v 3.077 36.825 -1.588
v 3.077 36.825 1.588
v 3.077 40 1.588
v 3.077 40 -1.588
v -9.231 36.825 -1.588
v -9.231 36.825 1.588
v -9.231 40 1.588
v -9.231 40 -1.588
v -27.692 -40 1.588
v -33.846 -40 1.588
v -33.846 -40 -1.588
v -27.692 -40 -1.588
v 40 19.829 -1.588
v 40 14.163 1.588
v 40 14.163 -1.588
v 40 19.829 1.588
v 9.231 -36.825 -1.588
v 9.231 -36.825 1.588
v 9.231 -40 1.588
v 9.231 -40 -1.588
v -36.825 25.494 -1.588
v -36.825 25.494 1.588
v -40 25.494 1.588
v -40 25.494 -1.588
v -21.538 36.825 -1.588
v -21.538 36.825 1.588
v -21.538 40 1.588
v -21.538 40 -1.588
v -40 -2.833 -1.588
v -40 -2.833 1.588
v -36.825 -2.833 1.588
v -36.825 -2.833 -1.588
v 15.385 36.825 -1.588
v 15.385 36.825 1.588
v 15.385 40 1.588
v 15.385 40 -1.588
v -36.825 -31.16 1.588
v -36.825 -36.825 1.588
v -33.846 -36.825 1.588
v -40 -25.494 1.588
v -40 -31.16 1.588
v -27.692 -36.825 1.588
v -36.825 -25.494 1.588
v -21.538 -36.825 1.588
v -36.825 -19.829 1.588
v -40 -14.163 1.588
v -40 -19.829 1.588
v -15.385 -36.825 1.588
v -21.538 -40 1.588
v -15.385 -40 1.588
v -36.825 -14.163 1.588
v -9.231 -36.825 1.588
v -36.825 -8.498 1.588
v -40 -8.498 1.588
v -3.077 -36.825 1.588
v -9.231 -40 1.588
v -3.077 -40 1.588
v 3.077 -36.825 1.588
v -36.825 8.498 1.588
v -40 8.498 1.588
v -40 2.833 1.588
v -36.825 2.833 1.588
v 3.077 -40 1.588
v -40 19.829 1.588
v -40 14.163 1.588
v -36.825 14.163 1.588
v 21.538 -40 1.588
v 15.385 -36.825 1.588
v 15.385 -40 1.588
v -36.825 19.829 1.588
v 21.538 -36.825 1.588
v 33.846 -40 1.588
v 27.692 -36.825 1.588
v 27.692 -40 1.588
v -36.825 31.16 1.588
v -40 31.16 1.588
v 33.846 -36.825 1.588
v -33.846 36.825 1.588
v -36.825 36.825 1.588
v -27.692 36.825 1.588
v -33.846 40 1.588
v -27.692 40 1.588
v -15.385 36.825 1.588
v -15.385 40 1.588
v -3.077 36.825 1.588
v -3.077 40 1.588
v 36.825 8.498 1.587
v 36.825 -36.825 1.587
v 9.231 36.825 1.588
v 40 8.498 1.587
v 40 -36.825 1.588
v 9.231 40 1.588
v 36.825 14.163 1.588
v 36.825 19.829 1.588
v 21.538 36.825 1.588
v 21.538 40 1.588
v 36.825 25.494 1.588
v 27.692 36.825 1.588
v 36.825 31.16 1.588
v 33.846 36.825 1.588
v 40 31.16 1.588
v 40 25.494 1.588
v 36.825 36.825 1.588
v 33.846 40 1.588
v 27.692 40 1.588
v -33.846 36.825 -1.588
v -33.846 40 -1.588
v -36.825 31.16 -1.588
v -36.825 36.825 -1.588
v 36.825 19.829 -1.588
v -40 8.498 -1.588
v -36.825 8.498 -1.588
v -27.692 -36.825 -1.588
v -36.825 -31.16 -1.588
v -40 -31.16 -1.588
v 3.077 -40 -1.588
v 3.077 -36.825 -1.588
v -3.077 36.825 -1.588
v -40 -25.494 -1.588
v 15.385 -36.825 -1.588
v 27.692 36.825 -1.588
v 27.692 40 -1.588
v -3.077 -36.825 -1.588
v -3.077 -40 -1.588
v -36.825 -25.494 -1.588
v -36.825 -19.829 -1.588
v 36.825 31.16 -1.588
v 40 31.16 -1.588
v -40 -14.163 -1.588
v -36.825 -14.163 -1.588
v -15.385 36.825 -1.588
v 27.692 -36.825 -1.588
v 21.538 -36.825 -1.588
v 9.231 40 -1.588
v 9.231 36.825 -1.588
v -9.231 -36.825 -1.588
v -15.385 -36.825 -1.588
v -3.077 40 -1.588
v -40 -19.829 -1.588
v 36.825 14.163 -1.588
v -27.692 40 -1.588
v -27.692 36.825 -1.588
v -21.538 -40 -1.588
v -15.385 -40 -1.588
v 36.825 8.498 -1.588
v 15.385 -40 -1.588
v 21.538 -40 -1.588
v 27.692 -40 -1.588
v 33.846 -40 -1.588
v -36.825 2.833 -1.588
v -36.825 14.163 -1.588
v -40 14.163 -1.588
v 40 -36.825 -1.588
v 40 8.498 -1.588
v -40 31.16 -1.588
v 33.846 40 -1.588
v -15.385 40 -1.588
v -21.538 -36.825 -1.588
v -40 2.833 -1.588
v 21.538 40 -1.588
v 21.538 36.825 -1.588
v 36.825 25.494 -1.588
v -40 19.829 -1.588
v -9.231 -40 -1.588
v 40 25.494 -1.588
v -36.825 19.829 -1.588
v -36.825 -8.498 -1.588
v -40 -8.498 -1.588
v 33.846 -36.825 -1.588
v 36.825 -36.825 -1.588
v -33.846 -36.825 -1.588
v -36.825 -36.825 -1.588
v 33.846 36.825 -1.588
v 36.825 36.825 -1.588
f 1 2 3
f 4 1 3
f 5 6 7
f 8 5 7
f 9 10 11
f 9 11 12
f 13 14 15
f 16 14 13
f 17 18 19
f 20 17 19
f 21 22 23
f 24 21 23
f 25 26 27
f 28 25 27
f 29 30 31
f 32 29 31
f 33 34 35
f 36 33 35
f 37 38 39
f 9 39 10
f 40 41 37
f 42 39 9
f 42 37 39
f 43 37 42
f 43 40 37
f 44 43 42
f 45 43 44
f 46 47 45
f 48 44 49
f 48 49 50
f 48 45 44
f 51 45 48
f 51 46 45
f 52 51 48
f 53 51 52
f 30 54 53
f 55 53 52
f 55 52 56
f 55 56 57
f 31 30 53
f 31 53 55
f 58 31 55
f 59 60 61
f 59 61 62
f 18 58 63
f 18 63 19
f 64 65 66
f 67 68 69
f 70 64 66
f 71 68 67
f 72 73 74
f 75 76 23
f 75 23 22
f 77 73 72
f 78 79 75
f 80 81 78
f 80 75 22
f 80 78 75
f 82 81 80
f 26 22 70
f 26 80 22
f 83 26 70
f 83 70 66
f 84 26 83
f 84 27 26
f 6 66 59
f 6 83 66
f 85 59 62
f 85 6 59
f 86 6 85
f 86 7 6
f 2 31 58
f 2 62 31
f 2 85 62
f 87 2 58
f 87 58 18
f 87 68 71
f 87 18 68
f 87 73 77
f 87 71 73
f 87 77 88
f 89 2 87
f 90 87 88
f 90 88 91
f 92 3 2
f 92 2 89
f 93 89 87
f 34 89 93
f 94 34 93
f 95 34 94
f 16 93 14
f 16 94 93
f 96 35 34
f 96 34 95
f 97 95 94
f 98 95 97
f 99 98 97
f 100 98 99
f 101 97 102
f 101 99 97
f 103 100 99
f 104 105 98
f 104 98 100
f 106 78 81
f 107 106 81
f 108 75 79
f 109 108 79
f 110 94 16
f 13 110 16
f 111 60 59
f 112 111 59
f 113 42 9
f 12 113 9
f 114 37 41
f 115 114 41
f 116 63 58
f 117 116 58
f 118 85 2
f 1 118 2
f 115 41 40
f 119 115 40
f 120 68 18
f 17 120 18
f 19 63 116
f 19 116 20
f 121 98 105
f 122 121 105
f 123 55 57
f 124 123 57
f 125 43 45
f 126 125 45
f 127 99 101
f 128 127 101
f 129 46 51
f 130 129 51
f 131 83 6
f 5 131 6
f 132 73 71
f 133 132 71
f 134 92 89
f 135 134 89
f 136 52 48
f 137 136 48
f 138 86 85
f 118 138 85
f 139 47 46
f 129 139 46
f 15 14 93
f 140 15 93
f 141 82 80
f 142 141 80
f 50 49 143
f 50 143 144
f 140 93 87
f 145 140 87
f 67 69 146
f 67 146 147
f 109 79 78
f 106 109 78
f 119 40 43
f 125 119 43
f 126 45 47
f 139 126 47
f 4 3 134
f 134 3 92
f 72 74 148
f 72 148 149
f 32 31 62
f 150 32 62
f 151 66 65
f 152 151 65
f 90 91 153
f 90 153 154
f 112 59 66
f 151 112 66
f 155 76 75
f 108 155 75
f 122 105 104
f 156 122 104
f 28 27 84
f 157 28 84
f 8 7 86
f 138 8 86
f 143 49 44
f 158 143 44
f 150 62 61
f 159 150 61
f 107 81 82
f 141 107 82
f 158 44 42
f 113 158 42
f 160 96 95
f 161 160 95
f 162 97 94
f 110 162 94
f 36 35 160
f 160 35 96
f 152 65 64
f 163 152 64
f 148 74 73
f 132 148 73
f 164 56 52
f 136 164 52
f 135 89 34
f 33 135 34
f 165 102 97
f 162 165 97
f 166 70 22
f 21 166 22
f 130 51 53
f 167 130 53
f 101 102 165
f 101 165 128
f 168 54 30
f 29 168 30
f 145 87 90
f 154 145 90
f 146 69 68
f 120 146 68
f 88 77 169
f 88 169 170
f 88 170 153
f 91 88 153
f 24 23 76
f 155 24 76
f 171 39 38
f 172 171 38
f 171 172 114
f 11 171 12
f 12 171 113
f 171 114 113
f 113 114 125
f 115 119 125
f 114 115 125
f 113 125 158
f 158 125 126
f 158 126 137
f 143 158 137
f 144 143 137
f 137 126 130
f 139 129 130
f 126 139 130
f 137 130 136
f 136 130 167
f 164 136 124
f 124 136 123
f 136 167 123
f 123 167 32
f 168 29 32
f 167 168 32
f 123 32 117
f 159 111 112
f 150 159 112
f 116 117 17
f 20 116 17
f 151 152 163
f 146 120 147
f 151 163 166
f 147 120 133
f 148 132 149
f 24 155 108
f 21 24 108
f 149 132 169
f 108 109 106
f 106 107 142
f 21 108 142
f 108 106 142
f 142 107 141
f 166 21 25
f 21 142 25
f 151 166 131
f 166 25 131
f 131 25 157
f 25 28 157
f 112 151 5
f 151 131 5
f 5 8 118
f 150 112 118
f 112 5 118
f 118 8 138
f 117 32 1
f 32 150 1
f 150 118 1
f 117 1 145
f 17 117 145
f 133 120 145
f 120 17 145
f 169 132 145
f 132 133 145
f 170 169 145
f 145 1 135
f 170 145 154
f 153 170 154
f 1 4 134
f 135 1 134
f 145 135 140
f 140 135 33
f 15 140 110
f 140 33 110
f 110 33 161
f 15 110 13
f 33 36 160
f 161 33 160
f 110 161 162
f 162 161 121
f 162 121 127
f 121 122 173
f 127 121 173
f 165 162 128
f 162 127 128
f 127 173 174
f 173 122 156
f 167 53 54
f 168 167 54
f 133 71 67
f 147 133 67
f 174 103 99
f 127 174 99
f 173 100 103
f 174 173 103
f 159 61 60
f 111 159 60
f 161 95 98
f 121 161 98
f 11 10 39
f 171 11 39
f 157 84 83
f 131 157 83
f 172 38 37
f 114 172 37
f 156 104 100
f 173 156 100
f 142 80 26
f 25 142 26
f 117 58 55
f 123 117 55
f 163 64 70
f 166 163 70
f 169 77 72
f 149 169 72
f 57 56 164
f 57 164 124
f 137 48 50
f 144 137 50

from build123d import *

# Parameters (mm, degrees)
SKETCH1_W           = 80
SKETCH1_H           = 80
BOSS_EXTRUDE1_DEPTH = 1.5875
SKETCH3_OUTSIDE_W   = 104.636
SKETCH3_OUTSIDE_H   = 104.636
CUT_EXTRUDE2_DEPTH  = 57.657573413
SKETCH4_W           = 3.175
SKETCH4_H           = 45.323076923
BOSS_EXTRUDE2_DEPTH = 3.175


with BuildPart() as part:
    # Sketch1 → Boss-Extrude1 (new, symmetric)
    with BuildSketch(Plane.XY):
        Rectangle(SKETCH1_W, SKETCH1_H)
    extrude(amount=BOSS_EXTRUDE1_DEPTH, both=True)

    # Sketch3 outside → Cut-Extrude2 (cut, through all)
    with BuildSketch(Plane.XY.offset(1.5875)):
        Rectangle(SKETCH3_OUTSIDE_W, SKETCH3_OUTSIDE_H)
        Polygon((-36.825, 36.825), (-33.846153846, 36.825), (-33.846153846, 40), (-27.692307692, 40), (-27.692307692, 36.825), (-21.538461538, 36.825), (-21.538461538, 40), (-15.384615385, 40), (-15.384615385, 36.825), (-9.230769231, 36.825), (-9.230769231, 40), (-3.076923077, 40), (-3.076923077, 36.825), (3.076923077, 36.825), (3.076923077, 40), (9.230769231, 40), (9.230769231, 36.825), (15.384615385, 36.825), (15.384615385, 40), (21.538461538, 40), (21.538461538, 36.825), (27.692307692, 36.825), (27.692307692, 40), (33.846153846, 40), (33.846153846, 36.825), (36.825, 36.825), (36.825, 31.159615385), (40, 31.159615385), (40, 25.494230769), (36.825, 25.494230769), (36.825, 19.828846154), (40, 19.828846154), (40, 14.163461538), (36.825, 14.163461538), (36.825, 8.498076923), (40, 8.498076923), (40, 2.832692308), (36.825, 2.832692308), (36.825, -2.832692308), (40, -2.832692308), (40, -8.498076923), (36.825, -8.498076923), (36.825, -14.163461538), (40, -14.163461538), (40, -19.828846154), (36.825, -19.828846154), (36.825, -25.494230769), (40, -25.494230769), (40, -31.159615385), (36.825, -31.159615385), (36.825, -36.825), (33.846153846, -36.825), (33.846153846, -40), (27.692307692, -40), (27.692307692, -36.825), (21.538461538, -36.825), (21.538461538, -40), (15.384615385, -40), (15.384615385, -36.825), (9.230769231, -36.825), (9.230769231, -40), (3.076923077, -40), (3.076923077, -36.825), (-3.076923077, -36.825), (-3.076923077, -40), (-9.230769231, -40), (-9.230769231, -36.825), (-15.384615385, -36.825), (-15.384615385, -40), (-21.538461538, -40), (-21.538461538, -36.825), (-27.692307692, -36.825), (-27.692307692, -40), (-33.846153846, -40), (-33.846153846, -36.825), (-36.825, -36.825), (-36.825, -31.159615385), (-40, -31.159615385), (-40, -25.494230769), (-36.825, -25.494230769), (-36.825, -19.828846154), (-40, -19.828846154), (-40, -14.163461538), (-36.825, -14.163461538), (-36.825, -8.498076923), (-40, -8.498076923), (-40, -2.832692308), (-36.825, -2.832692308), (-36.825, 2.832692308), (-40, 2.832692308), (-40, 8.498076923), (-36.825, 8.498076923), (-36.825, 14.163461538), (-40, 14.163461538), (-40, 19.828846154), (-36.825, 19.828846154), (-36.825, 25.494230769), (-40, 25.494230769), (-40, 31.159615385), (-36.825, 31.159615385), align=None, mode=Mode.SUBTRACT)
    extrude(amount=-CUT_EXTRUDE2_DEPTH, mode=Mode.SUBTRACT)

    # Sketch4 → Boss-Extrude2 (add)
    with BuildSketch(Plane.XY.offset(1.5875)):
        with Locations((38.4125, -14.163461539)):
            Rectangle(SKETCH4_W, SKETCH4_H)
    extrude(amount=-BOSS_EXTRUDE2_DEPTH)


solid = part.part
